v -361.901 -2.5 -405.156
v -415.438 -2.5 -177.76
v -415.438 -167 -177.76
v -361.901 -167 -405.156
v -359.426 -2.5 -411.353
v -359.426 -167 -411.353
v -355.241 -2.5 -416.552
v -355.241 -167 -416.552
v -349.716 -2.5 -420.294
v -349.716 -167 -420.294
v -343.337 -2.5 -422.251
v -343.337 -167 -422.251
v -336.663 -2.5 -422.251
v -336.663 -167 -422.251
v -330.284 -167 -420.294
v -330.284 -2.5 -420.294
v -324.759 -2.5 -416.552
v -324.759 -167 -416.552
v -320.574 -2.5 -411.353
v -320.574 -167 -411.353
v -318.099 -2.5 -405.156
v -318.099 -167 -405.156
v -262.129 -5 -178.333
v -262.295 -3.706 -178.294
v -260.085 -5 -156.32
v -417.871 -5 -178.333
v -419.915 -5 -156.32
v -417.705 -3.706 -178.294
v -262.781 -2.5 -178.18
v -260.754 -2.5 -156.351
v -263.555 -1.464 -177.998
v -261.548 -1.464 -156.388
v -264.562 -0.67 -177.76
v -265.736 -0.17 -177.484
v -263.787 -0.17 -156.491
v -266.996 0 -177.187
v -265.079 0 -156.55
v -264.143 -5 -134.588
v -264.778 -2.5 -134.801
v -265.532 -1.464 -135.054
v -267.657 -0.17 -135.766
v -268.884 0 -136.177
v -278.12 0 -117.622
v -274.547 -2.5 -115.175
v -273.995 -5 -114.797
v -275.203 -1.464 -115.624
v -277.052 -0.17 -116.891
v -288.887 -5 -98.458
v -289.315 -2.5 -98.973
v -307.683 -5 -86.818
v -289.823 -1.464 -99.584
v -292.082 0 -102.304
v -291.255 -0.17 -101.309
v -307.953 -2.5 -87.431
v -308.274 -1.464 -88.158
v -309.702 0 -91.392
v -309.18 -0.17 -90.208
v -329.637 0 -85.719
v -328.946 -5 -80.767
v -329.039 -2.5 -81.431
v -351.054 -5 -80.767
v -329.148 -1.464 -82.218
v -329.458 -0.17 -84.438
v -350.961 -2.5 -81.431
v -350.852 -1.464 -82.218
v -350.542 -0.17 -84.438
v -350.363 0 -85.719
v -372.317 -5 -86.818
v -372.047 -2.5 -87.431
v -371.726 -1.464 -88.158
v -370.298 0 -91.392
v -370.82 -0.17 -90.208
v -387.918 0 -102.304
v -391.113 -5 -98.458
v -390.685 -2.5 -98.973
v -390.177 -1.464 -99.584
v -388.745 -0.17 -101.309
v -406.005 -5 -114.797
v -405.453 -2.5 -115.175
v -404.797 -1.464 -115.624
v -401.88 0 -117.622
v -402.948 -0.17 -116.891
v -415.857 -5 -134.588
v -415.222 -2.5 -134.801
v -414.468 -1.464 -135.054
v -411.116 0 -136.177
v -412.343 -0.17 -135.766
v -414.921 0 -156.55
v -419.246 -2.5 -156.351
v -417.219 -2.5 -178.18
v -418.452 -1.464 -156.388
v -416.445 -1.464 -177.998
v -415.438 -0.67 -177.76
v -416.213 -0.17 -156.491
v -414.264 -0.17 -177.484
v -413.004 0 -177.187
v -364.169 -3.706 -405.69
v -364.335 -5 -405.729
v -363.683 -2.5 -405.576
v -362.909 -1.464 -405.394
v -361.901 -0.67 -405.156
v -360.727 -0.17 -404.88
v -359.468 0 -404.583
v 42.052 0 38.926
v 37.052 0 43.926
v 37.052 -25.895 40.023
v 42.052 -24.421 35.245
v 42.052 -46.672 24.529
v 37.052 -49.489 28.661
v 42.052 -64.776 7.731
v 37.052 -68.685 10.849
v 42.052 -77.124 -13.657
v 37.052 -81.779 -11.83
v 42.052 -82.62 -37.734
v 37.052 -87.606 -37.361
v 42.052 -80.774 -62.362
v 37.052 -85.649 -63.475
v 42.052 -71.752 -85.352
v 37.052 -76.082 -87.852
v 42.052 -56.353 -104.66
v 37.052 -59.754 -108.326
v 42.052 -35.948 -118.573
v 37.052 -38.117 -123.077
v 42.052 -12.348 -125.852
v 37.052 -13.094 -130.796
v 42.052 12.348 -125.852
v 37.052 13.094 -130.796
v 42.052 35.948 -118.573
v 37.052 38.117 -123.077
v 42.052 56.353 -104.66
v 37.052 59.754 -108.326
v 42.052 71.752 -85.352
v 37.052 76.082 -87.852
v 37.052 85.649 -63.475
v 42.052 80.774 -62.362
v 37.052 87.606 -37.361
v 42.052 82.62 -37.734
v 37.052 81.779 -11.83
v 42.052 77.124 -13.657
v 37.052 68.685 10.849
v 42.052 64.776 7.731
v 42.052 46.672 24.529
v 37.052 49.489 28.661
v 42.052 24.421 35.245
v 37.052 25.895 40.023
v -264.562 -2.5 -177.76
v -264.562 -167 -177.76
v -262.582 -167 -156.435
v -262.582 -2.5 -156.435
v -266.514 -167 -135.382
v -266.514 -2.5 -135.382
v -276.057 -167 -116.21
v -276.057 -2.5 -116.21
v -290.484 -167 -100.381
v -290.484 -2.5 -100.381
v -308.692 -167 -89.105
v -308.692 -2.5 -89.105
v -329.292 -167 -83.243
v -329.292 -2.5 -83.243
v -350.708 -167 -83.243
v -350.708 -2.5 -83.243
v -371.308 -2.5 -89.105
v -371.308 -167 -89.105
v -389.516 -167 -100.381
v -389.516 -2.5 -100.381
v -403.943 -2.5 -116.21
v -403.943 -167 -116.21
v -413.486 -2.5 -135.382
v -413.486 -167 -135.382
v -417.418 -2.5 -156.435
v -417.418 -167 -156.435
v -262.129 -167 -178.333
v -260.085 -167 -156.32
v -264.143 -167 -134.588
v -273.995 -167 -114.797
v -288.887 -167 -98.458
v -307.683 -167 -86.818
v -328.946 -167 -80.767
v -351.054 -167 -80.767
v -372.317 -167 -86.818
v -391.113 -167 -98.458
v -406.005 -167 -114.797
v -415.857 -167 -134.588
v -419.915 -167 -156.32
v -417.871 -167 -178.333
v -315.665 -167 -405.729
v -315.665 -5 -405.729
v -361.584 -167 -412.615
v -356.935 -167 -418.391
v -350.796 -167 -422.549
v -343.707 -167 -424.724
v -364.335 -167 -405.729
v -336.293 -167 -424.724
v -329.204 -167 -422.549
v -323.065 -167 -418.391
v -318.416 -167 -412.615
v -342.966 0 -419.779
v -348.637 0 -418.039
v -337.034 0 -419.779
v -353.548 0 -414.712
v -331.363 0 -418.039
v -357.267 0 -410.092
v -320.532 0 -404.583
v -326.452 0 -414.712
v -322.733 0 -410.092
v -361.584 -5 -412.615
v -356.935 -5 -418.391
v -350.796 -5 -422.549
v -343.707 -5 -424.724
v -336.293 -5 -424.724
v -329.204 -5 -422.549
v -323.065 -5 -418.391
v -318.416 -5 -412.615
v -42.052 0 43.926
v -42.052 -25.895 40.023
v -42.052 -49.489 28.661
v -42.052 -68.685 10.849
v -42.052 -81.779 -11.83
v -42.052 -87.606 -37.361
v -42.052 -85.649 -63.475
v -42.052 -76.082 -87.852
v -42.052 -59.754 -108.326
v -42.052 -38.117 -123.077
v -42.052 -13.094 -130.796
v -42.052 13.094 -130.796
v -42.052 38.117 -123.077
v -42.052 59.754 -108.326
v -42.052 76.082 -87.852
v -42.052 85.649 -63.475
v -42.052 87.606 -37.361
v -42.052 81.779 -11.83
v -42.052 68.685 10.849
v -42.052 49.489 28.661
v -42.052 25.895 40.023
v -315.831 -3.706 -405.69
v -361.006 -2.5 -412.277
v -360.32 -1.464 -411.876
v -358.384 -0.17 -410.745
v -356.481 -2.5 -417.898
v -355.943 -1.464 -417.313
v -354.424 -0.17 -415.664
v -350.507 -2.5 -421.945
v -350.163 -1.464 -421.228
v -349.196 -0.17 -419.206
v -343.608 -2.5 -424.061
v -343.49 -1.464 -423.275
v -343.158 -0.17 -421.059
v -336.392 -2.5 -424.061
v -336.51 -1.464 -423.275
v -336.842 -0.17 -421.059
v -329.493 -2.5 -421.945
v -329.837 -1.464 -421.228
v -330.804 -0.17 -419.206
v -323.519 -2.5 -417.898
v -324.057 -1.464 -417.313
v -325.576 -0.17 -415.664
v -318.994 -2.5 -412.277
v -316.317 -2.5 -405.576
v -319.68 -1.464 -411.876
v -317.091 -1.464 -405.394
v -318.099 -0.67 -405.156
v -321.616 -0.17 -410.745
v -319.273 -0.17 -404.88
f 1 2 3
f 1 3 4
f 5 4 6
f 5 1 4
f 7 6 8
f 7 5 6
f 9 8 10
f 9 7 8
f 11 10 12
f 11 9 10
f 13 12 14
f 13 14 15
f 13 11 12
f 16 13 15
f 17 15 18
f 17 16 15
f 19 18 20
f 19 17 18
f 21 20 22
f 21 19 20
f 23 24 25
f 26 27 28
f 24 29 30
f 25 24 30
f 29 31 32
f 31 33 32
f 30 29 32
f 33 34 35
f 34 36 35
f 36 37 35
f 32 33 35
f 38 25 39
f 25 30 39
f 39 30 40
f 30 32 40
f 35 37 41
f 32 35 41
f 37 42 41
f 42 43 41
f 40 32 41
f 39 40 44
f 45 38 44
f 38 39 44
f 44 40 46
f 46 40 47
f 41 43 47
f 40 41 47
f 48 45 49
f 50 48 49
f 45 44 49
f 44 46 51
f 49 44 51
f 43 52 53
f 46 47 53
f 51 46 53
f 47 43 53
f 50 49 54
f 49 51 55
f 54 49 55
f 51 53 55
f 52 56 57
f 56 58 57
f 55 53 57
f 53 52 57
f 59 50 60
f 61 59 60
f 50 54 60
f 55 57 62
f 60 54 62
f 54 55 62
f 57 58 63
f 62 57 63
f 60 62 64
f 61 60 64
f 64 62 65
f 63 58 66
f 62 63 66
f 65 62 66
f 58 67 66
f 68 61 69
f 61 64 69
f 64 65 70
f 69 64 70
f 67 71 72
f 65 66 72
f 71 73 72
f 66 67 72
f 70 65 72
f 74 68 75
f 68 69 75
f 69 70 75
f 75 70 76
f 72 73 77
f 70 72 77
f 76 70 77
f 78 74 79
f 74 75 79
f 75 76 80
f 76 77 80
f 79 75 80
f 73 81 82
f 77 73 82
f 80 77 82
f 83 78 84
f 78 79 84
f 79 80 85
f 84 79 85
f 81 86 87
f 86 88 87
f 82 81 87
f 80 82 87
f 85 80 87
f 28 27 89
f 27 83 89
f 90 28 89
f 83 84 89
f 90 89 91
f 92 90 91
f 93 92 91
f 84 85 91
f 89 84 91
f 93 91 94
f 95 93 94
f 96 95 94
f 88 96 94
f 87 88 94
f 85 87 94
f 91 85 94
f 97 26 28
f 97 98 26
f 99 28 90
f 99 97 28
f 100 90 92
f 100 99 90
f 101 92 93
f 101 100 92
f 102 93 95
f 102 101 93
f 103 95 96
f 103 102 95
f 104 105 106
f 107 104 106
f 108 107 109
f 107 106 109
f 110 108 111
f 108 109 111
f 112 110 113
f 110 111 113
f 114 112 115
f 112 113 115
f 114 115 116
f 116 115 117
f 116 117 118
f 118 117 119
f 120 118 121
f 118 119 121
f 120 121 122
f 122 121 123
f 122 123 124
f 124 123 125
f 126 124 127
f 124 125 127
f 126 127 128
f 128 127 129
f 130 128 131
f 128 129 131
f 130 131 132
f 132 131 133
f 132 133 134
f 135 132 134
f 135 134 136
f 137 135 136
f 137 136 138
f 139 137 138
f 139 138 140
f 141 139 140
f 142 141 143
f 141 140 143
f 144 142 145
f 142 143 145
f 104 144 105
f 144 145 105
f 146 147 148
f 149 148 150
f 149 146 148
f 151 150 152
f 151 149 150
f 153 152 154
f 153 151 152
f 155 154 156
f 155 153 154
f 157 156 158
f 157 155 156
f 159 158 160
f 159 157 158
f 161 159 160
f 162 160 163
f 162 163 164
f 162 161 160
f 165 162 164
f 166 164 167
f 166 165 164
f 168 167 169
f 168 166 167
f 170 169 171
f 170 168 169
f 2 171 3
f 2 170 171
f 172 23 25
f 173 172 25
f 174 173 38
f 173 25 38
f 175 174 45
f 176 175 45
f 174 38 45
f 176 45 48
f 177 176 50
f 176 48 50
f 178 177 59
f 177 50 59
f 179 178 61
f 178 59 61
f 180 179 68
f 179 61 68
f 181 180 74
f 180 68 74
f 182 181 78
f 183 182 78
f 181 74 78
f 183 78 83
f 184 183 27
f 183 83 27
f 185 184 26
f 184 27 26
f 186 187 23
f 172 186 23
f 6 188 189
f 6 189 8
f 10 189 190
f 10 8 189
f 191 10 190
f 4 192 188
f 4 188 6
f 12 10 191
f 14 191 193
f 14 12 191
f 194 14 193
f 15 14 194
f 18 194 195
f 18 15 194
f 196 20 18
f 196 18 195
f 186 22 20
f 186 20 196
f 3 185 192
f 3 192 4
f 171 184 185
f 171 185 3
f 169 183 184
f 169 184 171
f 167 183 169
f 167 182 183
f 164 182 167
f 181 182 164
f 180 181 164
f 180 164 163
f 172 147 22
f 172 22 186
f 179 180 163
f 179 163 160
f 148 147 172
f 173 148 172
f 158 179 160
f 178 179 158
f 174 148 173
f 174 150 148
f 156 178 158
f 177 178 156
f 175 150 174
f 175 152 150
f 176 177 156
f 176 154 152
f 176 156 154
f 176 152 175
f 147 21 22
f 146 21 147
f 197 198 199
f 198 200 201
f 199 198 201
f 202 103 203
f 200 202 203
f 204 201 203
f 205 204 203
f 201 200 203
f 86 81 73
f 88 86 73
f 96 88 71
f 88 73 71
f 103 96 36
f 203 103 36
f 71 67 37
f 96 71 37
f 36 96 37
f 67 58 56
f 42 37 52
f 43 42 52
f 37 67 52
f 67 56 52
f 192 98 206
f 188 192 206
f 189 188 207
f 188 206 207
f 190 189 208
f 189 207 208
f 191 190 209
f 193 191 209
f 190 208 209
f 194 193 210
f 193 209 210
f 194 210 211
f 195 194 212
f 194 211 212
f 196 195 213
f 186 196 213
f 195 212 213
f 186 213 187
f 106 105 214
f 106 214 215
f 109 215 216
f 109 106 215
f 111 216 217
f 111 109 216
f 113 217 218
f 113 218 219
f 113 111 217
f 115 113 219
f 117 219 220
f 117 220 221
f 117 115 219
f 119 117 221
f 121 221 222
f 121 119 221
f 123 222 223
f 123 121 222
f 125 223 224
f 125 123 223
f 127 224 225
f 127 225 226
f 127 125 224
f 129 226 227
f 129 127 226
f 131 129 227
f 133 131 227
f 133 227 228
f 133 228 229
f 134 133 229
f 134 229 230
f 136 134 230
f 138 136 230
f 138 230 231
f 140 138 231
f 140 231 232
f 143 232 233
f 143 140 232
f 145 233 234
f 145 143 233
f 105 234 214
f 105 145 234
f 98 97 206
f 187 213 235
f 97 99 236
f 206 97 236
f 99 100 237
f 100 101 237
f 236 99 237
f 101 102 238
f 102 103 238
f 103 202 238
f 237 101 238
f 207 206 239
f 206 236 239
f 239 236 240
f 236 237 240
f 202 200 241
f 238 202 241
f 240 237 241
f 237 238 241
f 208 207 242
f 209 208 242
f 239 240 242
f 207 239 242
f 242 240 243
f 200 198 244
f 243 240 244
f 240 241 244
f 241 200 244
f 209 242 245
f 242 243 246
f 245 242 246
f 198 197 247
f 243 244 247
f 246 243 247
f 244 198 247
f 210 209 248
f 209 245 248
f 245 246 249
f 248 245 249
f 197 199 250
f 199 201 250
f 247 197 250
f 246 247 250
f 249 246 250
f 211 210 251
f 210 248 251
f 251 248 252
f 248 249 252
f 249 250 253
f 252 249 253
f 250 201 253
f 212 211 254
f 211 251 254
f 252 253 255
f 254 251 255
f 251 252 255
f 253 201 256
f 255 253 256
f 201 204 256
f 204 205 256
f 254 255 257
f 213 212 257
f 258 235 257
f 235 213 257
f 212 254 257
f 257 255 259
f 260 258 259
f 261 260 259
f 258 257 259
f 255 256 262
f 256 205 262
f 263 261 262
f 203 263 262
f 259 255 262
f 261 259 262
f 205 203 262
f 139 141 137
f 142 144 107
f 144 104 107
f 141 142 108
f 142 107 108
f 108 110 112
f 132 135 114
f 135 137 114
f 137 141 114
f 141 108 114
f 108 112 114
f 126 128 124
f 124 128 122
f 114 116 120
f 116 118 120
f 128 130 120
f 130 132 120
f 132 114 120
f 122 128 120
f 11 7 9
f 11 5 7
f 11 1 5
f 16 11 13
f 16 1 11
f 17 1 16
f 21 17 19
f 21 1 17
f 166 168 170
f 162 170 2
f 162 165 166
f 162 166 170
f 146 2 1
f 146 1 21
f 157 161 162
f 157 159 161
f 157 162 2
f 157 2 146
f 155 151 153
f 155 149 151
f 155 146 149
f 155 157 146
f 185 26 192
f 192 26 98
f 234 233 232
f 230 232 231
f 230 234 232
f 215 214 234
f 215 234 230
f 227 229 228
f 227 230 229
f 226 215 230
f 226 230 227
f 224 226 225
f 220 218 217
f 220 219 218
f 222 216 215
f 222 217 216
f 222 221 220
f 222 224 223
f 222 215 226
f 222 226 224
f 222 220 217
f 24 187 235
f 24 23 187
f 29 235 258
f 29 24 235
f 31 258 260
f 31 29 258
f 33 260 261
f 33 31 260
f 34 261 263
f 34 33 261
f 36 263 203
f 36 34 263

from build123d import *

# Parameters (mm, degrees)
F2_DEPTH = 167
F0_W     = 84.1044187546
F0_H     = 87.85161376
F4_T     = -2.5
F5_R     = 5
F6_SIZE  = 5


with BuildPart() as f2:
    # F1 (on Front) → F2 (new body)
    with BuildSketch(Plane.XZ):
        with BuildLine():
            Line((-315.6653200287, -405.7291666667), (-262.1290240918, -178.3333333333))
            ThreePointArc((-262.1290240918, -178.3333333333), (-340, -80), (-417.8709759082, -178.3333333333))
            Line((-417.8709759082, -178.3333333333), (-364.3346799713, -405.7291666667))
            ThreePointArc((-364.3346799713, -405.7291666667), (-340, -425), (-315.6653200287, -405.7291666667))
        make_face()
    extrude(amount=F2_DEPTH)

    # F4
    f4_openings = [f2.faces().sort_by_distance(p)[0] for p in [
        (-340, -167, -226.923814),
    ]]
    offset(amount=F4_T, openings=f4_openings)

    # F5
    f5_edges = [f2.edges().sort_by_distance(p)[0] for p in [
        (-288.897172, 0, -292.03125),
    ]]
    fillet(f5_edges, radius=F5_R)


with BuildPart() as f3:
    # F0 (on Front) → F3 (revolve)
    with BuildSketch(Plane.XZ):
        Rectangle(F0_W, F0_H)
    revolve(axis=Axis((0, 0, -43.92580688), (1, 0, 0)))

    # F6
    f6_edges = [f3.edges().sort_by_distance(p)[0] for p in [
        (42.052209, 0, -131.777421),
    ]]
    chamfer(f6_edges, length=F6_SIZE)


solid = Compound([f2.part, f3.part])
